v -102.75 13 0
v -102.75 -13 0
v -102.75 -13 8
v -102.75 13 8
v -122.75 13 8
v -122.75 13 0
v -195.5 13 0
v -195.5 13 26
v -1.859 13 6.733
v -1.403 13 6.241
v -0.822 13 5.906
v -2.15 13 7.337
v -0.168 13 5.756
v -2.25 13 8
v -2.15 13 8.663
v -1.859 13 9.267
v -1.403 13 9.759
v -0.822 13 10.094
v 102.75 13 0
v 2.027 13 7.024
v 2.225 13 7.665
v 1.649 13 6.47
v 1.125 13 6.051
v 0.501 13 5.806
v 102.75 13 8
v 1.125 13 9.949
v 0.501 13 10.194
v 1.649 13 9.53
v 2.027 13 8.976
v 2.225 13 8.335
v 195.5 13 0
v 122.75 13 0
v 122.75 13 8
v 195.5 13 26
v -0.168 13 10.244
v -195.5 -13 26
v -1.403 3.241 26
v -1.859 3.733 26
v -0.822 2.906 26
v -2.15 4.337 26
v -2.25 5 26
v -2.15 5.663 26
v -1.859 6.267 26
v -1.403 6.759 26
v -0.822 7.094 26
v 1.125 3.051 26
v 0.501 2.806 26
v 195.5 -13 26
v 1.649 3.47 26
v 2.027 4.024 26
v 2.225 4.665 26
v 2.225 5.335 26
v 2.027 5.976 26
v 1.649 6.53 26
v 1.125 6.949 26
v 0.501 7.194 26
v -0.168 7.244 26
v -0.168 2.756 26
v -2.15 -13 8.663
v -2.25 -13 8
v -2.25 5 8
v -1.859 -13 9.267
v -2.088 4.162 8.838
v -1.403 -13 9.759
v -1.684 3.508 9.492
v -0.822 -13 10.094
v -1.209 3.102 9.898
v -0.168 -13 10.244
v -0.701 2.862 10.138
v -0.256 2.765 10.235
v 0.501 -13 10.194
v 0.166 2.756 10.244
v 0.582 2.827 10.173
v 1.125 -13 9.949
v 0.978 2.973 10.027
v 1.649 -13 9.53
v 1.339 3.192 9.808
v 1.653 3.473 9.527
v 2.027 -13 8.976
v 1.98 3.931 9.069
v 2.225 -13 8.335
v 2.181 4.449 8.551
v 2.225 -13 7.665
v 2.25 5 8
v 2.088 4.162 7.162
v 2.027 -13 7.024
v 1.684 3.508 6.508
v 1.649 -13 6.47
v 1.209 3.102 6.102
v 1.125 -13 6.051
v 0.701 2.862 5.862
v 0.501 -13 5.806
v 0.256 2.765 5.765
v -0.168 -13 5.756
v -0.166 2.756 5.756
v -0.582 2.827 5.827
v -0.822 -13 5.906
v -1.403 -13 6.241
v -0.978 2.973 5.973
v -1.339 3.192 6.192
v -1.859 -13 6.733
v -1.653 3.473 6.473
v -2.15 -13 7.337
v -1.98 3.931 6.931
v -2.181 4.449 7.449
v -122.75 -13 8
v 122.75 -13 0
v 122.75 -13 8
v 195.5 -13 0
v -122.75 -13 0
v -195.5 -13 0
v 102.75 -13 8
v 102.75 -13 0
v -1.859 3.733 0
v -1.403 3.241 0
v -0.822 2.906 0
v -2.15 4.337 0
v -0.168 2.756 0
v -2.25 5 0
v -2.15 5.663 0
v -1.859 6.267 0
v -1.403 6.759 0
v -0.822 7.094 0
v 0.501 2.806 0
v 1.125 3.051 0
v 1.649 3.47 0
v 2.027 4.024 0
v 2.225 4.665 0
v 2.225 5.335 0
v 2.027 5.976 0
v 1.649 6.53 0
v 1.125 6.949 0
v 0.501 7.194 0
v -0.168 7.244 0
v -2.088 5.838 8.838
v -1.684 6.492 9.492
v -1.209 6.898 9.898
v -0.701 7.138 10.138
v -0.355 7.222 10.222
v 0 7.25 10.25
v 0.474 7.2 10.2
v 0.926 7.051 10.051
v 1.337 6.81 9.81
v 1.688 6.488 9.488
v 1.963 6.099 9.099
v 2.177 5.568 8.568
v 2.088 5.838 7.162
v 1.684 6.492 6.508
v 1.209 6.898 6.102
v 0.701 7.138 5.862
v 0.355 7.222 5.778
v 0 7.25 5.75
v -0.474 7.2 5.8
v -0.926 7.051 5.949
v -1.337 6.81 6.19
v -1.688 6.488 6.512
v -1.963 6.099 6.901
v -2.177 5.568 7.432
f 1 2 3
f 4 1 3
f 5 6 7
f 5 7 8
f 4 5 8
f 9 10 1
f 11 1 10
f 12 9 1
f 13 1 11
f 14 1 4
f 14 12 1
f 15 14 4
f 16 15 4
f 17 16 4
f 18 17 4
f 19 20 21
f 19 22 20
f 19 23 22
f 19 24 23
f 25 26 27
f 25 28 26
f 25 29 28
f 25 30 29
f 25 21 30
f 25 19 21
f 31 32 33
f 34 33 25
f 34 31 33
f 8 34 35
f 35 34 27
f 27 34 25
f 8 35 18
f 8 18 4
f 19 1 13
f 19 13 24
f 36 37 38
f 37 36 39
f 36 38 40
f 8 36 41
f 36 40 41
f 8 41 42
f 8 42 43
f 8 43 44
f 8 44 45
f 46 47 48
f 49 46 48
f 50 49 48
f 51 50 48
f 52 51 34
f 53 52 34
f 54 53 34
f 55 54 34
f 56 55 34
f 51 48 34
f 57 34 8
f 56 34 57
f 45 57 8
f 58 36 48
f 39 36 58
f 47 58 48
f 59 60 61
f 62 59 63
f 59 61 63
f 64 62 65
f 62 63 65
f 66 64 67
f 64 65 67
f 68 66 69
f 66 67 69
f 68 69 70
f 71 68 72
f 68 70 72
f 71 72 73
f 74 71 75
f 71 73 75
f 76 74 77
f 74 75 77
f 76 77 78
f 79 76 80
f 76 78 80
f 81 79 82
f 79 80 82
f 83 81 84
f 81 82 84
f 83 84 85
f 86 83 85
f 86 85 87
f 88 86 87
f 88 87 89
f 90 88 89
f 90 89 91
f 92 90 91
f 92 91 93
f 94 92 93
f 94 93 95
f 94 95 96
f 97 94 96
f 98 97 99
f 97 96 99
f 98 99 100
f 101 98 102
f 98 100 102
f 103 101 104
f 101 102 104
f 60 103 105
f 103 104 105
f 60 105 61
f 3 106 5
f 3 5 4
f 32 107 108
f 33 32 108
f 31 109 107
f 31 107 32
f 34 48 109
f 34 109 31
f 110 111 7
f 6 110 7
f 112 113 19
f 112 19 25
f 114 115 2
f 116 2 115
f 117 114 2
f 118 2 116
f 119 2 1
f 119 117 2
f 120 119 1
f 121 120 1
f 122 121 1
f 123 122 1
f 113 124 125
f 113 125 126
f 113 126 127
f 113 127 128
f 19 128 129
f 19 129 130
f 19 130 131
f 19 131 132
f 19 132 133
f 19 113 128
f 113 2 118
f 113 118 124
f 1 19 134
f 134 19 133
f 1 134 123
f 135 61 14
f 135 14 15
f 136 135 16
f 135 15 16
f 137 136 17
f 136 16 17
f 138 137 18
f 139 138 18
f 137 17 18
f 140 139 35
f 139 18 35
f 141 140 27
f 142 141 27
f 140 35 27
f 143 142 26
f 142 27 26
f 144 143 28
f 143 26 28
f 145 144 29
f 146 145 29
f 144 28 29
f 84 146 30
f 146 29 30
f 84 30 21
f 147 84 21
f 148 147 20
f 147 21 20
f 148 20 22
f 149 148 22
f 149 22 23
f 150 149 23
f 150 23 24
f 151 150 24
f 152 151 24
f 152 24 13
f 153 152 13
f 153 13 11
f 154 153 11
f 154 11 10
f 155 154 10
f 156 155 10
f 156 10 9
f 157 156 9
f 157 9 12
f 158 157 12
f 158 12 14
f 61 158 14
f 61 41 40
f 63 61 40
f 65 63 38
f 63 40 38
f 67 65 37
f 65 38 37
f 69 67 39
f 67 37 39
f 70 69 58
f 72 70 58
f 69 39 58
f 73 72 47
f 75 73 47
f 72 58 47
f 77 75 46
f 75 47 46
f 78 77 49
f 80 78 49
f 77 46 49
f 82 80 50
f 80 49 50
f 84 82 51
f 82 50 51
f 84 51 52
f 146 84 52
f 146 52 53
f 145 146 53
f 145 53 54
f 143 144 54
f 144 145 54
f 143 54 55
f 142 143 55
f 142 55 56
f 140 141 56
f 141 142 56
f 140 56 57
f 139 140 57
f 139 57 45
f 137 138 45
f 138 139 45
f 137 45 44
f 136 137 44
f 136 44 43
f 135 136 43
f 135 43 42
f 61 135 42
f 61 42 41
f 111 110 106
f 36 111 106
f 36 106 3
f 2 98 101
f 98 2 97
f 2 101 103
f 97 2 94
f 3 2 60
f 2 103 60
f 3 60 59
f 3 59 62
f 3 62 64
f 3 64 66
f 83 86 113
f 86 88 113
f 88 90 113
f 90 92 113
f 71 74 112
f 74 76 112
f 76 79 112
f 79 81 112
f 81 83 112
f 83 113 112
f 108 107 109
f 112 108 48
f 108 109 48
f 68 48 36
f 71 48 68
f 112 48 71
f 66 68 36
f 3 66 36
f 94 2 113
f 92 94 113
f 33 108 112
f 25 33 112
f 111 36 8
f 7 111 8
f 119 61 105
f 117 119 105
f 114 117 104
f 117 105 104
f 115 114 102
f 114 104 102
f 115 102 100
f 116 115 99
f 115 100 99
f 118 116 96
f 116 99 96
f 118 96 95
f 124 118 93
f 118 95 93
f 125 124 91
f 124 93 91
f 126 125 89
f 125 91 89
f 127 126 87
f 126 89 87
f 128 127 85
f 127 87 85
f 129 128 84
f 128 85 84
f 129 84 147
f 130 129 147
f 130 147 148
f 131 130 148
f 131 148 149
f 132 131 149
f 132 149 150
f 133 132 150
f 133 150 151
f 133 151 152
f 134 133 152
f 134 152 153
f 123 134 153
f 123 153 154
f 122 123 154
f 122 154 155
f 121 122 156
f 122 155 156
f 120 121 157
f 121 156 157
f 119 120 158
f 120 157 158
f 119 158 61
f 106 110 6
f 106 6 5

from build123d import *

# Parameters (mm, degrees)
F0_W     = 26
F0_H     = 26
F1_DEPTH = 195.5
F4_D     = 4.5
F6_D     = 4.5
F7_W     = 20
F7_H     = 8
F8_DEPTH = 26


# Not quite as in the source:
# - a pattern or mirror of a feature is missing from the dataset's text; its kind, count and spacing are read off the source's solid


with BuildPart() as f1:
    # F0 (on Right) → F1 (new body, symmetric)
    with BuildSketch(Plane.YZ):
        with Locations((0, 13)):
            Rectangle(F0_W, F0_H)
    extrude(amount=F1_DEPTH, both=True)

    # F4 (through all)
    with Locations(Plane.XZ.offset(13)):
        with Locations((0, 8)):
            Hole(F4_D / 2)

    # F6 (through all)
    with Locations(Plane(origin=(0, 0, 0), x_dir=(1, 0, 0), z_dir=(0, 0, -1))):
        with Locations((0, -5)):
            Hole(F6_D / 2)

    # F7 (on face) → F8 (cut, through all)
    with BuildSketch(Plane.XZ.offset(13)):
        with Locations((-112.75, 4)):
            Rectangle(F7_W, F7_H)
    f8 = extrude(amount=-F8_DEPTH, mode=Mode.SUBTRACT)

    # F8_copies: F8 across plane
    add(f8.mirror(Plane(origin=(0, 0, 0), x_dir=(0, 0, 1), z_dir=(1, 0, 0))), mode=Mode.SUBTRACT)


solid = f1.part
